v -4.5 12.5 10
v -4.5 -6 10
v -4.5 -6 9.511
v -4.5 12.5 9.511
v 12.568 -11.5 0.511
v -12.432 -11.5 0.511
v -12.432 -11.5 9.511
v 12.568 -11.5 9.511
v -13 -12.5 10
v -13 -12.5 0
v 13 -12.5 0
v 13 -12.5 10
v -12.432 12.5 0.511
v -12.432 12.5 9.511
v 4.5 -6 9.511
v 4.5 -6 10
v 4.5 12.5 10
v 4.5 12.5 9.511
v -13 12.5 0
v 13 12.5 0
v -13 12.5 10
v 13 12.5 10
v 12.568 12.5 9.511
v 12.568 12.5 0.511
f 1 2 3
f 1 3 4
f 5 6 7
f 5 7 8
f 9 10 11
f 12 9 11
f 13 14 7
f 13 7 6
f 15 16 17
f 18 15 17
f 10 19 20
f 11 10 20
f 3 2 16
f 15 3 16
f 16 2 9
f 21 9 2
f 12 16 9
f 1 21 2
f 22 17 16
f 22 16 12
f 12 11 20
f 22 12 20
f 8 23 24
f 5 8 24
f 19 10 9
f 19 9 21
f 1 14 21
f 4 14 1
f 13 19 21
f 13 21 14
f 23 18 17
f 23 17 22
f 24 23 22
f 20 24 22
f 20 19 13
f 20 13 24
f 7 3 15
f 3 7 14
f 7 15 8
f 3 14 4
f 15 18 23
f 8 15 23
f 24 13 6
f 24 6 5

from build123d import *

# Parameters (mm, degrees)
SKETCH1_W           = 26
SKETCH1_H           = 25
BOSS_EXTRUDE1_DEPTH = 10
SKETCH2_W           = 25
SKETCH2_H           = 9
CUT_EXTRUDE1_DEPTH  = 24
SKETCH3_W           = 9
SKETCH3_H           = 18.5
CUT_EXTRUDE2_DEPTH  = 5


with BuildPart() as part:
    # Sketch1 → Boss-Extrude1 (new body)
    with BuildSketch(Plane.XY):
        Rectangle(SKETCH1_W, SKETCH1_H)
    extrude(amount=BOSS_EXTRUDE1_DEPTH)

    # Sketch2 → Cut-Extrude1 (cut)
    with BuildSketch(Plane(origin=(0, 12.5, 0), x_dir=(1, 0, 0), z_dir=(0, 1, 0))):
        with Locations((0.067812243, -5.010506078)):
            Rectangle(SKETCH2_W, SKETCH2_H)
    extrude(amount=-CUT_EXTRUDE1_DEPTH, mode=Mode.SUBTRACT)

    # Sketch3 → Cut-Extrude2 (cut)
    with BuildSketch(Plane.XY.offset(10)):
        with Locations((0, 3.25)):
            Rectangle(SKETCH3_W, SKETCH3_H)
    extrude(amount=-CUT_EXTRUDE2_DEPTH, mode=Mode.SUBTRACT)


solid = part.part
